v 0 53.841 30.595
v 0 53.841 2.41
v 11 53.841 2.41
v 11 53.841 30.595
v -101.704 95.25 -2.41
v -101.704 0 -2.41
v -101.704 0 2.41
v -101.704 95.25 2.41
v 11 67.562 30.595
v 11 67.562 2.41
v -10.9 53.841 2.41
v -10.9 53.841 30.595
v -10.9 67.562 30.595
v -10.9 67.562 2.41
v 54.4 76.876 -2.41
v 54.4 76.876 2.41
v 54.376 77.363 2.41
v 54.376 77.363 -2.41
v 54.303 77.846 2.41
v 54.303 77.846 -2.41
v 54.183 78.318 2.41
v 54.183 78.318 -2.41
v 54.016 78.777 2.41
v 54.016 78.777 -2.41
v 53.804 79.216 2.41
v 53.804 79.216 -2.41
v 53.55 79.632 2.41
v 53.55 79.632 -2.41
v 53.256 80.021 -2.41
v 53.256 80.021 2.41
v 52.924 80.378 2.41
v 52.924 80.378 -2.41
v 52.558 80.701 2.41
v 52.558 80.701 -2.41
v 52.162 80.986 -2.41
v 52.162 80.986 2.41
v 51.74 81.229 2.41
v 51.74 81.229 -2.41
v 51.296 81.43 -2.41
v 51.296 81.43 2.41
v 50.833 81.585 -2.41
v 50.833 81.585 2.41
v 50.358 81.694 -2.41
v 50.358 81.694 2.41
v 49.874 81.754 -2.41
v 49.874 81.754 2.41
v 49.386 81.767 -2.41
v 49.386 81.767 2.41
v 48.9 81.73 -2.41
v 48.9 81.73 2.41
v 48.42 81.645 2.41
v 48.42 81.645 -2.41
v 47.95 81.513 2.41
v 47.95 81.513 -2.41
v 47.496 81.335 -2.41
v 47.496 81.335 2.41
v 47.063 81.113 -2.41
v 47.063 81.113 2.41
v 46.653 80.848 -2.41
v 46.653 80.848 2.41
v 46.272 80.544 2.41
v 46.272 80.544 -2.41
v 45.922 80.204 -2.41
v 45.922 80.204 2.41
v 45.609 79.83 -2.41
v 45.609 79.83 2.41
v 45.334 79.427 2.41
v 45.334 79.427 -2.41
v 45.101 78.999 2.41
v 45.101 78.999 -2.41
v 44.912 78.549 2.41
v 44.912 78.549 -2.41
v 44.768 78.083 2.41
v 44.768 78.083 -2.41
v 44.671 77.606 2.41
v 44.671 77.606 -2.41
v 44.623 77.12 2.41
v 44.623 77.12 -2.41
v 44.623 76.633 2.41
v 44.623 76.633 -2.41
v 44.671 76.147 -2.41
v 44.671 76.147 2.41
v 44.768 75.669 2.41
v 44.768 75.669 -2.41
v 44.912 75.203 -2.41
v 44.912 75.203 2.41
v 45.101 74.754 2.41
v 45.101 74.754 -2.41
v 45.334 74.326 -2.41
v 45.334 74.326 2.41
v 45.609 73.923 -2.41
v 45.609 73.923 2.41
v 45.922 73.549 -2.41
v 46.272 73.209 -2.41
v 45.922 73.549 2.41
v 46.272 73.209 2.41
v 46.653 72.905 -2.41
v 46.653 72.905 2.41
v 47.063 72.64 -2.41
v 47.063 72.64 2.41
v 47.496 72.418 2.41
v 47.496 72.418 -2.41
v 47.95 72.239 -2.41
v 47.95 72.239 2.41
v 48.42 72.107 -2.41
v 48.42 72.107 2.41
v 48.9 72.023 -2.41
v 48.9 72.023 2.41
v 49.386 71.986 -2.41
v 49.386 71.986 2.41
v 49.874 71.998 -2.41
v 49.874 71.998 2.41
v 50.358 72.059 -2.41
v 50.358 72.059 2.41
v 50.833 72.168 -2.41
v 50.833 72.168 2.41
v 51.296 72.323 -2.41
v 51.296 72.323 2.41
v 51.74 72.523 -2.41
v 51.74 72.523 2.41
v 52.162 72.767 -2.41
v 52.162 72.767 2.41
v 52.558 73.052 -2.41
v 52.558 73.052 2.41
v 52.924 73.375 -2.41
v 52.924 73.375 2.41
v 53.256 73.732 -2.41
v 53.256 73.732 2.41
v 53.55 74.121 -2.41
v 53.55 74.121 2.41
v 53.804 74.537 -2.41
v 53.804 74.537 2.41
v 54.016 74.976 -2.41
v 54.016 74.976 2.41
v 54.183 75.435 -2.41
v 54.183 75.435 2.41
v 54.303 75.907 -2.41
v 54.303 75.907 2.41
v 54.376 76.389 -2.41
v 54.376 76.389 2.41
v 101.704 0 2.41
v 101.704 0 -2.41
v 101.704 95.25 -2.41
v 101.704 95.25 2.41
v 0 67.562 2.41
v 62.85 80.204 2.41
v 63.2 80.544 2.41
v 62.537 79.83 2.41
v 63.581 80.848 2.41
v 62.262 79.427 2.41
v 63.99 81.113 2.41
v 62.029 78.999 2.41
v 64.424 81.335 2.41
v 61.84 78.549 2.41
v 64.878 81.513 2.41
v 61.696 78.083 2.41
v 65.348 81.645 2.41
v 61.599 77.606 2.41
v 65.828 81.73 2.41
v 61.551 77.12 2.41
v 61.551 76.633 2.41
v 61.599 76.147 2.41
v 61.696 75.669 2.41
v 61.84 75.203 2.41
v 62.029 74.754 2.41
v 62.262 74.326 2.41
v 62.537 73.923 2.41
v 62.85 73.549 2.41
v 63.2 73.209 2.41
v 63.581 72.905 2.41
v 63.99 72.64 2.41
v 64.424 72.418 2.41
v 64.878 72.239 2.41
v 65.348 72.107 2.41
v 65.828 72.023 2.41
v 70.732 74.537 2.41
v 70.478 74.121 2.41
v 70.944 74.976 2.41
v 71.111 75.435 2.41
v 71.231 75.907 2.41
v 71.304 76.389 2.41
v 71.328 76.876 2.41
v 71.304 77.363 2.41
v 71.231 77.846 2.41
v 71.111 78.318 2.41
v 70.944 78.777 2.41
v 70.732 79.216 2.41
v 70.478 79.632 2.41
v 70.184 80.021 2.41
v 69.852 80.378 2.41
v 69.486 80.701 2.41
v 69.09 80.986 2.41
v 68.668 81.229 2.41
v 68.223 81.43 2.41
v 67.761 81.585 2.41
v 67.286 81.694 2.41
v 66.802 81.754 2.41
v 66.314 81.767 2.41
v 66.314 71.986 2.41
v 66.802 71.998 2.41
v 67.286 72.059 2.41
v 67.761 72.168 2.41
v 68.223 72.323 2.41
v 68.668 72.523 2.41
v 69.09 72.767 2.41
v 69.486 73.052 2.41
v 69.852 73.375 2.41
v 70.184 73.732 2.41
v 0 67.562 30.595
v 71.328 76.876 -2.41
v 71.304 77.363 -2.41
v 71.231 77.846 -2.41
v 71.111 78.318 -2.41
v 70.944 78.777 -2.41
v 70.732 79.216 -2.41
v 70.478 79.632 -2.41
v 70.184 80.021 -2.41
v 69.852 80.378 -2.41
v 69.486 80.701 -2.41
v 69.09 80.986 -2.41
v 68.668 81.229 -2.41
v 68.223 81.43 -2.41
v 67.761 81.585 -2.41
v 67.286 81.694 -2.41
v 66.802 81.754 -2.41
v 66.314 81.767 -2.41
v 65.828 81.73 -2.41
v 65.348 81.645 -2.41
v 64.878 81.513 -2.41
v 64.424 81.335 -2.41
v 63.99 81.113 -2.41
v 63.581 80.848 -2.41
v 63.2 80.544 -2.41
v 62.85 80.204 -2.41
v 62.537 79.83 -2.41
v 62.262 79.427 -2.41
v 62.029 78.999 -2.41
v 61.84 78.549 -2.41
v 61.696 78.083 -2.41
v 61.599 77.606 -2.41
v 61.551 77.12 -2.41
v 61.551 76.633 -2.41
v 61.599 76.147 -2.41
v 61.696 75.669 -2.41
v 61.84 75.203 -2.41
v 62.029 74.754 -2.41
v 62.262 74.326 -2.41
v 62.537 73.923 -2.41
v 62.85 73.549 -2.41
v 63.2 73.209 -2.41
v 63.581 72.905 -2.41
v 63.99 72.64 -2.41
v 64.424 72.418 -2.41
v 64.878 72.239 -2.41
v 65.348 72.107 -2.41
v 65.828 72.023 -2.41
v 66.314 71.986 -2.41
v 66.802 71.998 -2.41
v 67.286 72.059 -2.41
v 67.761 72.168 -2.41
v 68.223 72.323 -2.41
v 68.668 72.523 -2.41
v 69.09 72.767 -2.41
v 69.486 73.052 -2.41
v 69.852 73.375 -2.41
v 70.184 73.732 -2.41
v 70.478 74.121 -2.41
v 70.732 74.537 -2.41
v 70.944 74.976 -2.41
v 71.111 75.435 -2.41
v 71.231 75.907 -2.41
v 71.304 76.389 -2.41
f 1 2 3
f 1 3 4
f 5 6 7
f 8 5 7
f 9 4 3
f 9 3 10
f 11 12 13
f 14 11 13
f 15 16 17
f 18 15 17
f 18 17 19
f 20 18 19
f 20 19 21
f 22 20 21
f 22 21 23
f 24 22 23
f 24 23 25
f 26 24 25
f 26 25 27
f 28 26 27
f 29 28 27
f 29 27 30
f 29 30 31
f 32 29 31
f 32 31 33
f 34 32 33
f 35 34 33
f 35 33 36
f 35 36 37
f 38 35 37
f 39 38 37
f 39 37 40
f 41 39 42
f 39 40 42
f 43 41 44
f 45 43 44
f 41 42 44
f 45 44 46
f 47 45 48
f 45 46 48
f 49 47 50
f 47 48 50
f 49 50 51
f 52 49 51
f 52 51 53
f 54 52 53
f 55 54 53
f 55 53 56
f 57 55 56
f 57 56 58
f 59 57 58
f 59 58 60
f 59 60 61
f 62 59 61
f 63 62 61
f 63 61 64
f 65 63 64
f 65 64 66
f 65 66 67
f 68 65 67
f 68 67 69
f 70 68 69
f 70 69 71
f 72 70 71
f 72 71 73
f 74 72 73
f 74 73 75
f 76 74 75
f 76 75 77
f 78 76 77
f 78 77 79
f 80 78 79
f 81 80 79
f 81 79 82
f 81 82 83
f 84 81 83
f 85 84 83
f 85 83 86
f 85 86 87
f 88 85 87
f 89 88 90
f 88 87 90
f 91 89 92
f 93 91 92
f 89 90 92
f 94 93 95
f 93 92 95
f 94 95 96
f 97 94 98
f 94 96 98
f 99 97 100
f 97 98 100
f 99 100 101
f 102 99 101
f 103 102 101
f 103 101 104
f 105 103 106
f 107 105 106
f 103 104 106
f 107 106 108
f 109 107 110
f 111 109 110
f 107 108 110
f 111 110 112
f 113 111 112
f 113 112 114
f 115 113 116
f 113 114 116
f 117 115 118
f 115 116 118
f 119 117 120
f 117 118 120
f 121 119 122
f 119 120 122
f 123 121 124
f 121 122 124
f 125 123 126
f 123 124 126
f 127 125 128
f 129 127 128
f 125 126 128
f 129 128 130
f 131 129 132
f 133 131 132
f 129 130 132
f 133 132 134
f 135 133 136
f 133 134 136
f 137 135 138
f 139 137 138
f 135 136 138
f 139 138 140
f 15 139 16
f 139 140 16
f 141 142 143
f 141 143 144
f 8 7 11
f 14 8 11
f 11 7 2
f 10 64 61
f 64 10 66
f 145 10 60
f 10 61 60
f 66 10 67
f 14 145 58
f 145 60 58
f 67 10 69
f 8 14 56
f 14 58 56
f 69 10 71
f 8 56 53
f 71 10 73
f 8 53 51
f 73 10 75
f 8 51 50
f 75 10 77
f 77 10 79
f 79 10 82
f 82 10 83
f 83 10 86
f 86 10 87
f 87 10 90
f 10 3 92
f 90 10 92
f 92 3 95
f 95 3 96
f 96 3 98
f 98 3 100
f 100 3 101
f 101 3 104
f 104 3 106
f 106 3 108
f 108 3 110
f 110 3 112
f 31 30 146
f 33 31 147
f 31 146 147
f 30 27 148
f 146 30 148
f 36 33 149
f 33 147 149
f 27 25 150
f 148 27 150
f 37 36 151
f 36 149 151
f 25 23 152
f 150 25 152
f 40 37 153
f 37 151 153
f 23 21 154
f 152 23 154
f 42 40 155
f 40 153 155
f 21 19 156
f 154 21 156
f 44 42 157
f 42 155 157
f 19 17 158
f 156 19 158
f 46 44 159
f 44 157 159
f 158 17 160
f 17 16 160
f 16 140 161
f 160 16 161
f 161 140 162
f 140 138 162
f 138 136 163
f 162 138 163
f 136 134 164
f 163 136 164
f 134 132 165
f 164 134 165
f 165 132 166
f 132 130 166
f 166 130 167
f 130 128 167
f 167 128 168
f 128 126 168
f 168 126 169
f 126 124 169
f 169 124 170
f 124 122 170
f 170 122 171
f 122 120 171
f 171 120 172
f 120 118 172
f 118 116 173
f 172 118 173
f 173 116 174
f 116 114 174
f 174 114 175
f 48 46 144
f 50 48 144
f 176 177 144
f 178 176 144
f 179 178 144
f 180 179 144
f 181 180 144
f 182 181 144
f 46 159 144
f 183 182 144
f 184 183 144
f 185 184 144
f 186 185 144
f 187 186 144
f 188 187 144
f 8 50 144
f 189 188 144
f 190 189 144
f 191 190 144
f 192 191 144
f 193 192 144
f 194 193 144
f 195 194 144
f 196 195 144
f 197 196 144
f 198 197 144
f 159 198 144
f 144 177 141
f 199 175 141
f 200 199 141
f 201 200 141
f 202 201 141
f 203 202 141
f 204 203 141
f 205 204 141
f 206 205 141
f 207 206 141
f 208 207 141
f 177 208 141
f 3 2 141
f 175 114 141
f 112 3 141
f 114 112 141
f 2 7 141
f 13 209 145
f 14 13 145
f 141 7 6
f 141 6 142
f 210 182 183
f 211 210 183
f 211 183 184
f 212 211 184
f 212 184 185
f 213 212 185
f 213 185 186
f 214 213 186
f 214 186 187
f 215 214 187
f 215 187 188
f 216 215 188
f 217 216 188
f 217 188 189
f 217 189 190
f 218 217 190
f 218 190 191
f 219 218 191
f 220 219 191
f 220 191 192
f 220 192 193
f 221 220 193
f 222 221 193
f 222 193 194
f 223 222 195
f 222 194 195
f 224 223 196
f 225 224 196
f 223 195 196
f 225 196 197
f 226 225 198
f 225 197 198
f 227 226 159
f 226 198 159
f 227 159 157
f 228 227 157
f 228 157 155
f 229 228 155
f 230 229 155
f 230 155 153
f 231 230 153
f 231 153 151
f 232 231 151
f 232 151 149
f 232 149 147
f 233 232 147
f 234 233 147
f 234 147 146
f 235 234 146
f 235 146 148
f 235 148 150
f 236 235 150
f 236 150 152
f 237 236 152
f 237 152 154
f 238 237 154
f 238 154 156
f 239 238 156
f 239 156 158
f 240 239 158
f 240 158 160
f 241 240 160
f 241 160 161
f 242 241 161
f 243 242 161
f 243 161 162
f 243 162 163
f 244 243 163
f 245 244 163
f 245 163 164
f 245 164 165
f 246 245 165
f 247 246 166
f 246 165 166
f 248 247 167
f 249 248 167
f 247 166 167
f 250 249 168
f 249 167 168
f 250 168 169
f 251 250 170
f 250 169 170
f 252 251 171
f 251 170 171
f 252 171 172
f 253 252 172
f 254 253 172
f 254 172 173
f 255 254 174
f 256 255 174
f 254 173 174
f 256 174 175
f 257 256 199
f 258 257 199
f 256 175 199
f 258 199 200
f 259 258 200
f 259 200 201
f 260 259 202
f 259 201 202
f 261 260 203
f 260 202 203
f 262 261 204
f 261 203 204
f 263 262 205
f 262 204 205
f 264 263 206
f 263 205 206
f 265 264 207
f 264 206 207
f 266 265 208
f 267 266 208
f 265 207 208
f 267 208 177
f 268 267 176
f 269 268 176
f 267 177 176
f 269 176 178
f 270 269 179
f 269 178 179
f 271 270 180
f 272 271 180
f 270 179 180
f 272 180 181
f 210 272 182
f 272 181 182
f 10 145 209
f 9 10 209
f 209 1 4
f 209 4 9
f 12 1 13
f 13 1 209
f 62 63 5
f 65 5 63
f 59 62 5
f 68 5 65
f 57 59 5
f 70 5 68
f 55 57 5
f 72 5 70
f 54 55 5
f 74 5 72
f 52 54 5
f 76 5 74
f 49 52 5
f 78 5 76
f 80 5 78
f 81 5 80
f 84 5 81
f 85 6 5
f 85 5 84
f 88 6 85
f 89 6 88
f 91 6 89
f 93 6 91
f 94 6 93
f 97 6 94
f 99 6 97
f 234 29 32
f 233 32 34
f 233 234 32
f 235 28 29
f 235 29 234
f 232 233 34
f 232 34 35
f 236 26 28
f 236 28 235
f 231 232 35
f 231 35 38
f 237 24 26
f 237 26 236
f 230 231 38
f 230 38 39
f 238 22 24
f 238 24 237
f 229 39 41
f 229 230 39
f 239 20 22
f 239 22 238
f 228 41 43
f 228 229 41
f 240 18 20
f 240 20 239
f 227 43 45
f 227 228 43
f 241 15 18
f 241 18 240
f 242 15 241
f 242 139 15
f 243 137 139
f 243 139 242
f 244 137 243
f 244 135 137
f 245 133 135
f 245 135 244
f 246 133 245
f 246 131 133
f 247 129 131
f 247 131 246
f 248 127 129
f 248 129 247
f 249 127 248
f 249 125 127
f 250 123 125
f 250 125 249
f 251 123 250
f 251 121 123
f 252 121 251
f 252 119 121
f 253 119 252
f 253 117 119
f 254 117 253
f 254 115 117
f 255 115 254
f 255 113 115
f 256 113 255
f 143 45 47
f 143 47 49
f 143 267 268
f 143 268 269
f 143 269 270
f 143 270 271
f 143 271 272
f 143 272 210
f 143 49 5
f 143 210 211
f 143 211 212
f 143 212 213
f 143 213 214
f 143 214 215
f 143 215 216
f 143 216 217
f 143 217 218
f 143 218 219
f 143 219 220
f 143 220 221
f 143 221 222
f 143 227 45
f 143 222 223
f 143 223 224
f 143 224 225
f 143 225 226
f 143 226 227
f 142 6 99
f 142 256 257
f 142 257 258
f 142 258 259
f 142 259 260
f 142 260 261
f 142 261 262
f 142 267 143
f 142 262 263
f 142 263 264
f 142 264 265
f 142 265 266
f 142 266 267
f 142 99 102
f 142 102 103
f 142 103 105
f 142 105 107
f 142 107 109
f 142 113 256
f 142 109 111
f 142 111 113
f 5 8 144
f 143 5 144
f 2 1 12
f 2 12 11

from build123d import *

# Parameters (mm, degrees)
F0_W      = 203.408972
F0_H      = 4.820996
F1_DEPTH  = 95.25
F2_W      = 13.721295
F2_H      = 30.594785
F3_DEPTH  = 11
F3_FACE_W = 13.721294
F3_FACE_H = 28.184286
F4_DEPTH  = 10.9
F5_R      = 4.891712
F6_DEPTH  = 4.821996


with BuildPart() as f1:
    # F0 (on Front) → F1 (new body)
    with BuildSketch(Plane.XZ):
        Rectangle(F0_W, F0_H)
    extrude(amount=-F1_DEPTH)

    # F2 (on Right) → F3 (join)
    with BuildSketch(Plane.YZ):
        with Locations((60.701731, 15.297392)):
            Rectangle(F2_W, F2_H)
    extrude(amount=F3_DEPTH)

    # F3_face (on face) → F4 (join)
    with BuildSketch(Plane(origin=(0, 60.701732, 16.502641), x_dir=(0, 1, 0), z_dir=(-1, 0, 0))):
        Rectangle(F3_FACE_W, F3_FACE_H)
    extrude(amount=F4_DEPTH)

    # F5 (on face) → F6 (cut, through all)
    with BuildSketch(Plane.XY.offset(2.410498)):
        with Locations((66.436283, 76.876432)):
            Circle(F5_R)
        with Locations((49.508363, 76.876432)):
            Circle(F5_R)
    extrude(amount=-F6_DEPTH, mode=Mode.SUBTRACT)


solid = f1.part
